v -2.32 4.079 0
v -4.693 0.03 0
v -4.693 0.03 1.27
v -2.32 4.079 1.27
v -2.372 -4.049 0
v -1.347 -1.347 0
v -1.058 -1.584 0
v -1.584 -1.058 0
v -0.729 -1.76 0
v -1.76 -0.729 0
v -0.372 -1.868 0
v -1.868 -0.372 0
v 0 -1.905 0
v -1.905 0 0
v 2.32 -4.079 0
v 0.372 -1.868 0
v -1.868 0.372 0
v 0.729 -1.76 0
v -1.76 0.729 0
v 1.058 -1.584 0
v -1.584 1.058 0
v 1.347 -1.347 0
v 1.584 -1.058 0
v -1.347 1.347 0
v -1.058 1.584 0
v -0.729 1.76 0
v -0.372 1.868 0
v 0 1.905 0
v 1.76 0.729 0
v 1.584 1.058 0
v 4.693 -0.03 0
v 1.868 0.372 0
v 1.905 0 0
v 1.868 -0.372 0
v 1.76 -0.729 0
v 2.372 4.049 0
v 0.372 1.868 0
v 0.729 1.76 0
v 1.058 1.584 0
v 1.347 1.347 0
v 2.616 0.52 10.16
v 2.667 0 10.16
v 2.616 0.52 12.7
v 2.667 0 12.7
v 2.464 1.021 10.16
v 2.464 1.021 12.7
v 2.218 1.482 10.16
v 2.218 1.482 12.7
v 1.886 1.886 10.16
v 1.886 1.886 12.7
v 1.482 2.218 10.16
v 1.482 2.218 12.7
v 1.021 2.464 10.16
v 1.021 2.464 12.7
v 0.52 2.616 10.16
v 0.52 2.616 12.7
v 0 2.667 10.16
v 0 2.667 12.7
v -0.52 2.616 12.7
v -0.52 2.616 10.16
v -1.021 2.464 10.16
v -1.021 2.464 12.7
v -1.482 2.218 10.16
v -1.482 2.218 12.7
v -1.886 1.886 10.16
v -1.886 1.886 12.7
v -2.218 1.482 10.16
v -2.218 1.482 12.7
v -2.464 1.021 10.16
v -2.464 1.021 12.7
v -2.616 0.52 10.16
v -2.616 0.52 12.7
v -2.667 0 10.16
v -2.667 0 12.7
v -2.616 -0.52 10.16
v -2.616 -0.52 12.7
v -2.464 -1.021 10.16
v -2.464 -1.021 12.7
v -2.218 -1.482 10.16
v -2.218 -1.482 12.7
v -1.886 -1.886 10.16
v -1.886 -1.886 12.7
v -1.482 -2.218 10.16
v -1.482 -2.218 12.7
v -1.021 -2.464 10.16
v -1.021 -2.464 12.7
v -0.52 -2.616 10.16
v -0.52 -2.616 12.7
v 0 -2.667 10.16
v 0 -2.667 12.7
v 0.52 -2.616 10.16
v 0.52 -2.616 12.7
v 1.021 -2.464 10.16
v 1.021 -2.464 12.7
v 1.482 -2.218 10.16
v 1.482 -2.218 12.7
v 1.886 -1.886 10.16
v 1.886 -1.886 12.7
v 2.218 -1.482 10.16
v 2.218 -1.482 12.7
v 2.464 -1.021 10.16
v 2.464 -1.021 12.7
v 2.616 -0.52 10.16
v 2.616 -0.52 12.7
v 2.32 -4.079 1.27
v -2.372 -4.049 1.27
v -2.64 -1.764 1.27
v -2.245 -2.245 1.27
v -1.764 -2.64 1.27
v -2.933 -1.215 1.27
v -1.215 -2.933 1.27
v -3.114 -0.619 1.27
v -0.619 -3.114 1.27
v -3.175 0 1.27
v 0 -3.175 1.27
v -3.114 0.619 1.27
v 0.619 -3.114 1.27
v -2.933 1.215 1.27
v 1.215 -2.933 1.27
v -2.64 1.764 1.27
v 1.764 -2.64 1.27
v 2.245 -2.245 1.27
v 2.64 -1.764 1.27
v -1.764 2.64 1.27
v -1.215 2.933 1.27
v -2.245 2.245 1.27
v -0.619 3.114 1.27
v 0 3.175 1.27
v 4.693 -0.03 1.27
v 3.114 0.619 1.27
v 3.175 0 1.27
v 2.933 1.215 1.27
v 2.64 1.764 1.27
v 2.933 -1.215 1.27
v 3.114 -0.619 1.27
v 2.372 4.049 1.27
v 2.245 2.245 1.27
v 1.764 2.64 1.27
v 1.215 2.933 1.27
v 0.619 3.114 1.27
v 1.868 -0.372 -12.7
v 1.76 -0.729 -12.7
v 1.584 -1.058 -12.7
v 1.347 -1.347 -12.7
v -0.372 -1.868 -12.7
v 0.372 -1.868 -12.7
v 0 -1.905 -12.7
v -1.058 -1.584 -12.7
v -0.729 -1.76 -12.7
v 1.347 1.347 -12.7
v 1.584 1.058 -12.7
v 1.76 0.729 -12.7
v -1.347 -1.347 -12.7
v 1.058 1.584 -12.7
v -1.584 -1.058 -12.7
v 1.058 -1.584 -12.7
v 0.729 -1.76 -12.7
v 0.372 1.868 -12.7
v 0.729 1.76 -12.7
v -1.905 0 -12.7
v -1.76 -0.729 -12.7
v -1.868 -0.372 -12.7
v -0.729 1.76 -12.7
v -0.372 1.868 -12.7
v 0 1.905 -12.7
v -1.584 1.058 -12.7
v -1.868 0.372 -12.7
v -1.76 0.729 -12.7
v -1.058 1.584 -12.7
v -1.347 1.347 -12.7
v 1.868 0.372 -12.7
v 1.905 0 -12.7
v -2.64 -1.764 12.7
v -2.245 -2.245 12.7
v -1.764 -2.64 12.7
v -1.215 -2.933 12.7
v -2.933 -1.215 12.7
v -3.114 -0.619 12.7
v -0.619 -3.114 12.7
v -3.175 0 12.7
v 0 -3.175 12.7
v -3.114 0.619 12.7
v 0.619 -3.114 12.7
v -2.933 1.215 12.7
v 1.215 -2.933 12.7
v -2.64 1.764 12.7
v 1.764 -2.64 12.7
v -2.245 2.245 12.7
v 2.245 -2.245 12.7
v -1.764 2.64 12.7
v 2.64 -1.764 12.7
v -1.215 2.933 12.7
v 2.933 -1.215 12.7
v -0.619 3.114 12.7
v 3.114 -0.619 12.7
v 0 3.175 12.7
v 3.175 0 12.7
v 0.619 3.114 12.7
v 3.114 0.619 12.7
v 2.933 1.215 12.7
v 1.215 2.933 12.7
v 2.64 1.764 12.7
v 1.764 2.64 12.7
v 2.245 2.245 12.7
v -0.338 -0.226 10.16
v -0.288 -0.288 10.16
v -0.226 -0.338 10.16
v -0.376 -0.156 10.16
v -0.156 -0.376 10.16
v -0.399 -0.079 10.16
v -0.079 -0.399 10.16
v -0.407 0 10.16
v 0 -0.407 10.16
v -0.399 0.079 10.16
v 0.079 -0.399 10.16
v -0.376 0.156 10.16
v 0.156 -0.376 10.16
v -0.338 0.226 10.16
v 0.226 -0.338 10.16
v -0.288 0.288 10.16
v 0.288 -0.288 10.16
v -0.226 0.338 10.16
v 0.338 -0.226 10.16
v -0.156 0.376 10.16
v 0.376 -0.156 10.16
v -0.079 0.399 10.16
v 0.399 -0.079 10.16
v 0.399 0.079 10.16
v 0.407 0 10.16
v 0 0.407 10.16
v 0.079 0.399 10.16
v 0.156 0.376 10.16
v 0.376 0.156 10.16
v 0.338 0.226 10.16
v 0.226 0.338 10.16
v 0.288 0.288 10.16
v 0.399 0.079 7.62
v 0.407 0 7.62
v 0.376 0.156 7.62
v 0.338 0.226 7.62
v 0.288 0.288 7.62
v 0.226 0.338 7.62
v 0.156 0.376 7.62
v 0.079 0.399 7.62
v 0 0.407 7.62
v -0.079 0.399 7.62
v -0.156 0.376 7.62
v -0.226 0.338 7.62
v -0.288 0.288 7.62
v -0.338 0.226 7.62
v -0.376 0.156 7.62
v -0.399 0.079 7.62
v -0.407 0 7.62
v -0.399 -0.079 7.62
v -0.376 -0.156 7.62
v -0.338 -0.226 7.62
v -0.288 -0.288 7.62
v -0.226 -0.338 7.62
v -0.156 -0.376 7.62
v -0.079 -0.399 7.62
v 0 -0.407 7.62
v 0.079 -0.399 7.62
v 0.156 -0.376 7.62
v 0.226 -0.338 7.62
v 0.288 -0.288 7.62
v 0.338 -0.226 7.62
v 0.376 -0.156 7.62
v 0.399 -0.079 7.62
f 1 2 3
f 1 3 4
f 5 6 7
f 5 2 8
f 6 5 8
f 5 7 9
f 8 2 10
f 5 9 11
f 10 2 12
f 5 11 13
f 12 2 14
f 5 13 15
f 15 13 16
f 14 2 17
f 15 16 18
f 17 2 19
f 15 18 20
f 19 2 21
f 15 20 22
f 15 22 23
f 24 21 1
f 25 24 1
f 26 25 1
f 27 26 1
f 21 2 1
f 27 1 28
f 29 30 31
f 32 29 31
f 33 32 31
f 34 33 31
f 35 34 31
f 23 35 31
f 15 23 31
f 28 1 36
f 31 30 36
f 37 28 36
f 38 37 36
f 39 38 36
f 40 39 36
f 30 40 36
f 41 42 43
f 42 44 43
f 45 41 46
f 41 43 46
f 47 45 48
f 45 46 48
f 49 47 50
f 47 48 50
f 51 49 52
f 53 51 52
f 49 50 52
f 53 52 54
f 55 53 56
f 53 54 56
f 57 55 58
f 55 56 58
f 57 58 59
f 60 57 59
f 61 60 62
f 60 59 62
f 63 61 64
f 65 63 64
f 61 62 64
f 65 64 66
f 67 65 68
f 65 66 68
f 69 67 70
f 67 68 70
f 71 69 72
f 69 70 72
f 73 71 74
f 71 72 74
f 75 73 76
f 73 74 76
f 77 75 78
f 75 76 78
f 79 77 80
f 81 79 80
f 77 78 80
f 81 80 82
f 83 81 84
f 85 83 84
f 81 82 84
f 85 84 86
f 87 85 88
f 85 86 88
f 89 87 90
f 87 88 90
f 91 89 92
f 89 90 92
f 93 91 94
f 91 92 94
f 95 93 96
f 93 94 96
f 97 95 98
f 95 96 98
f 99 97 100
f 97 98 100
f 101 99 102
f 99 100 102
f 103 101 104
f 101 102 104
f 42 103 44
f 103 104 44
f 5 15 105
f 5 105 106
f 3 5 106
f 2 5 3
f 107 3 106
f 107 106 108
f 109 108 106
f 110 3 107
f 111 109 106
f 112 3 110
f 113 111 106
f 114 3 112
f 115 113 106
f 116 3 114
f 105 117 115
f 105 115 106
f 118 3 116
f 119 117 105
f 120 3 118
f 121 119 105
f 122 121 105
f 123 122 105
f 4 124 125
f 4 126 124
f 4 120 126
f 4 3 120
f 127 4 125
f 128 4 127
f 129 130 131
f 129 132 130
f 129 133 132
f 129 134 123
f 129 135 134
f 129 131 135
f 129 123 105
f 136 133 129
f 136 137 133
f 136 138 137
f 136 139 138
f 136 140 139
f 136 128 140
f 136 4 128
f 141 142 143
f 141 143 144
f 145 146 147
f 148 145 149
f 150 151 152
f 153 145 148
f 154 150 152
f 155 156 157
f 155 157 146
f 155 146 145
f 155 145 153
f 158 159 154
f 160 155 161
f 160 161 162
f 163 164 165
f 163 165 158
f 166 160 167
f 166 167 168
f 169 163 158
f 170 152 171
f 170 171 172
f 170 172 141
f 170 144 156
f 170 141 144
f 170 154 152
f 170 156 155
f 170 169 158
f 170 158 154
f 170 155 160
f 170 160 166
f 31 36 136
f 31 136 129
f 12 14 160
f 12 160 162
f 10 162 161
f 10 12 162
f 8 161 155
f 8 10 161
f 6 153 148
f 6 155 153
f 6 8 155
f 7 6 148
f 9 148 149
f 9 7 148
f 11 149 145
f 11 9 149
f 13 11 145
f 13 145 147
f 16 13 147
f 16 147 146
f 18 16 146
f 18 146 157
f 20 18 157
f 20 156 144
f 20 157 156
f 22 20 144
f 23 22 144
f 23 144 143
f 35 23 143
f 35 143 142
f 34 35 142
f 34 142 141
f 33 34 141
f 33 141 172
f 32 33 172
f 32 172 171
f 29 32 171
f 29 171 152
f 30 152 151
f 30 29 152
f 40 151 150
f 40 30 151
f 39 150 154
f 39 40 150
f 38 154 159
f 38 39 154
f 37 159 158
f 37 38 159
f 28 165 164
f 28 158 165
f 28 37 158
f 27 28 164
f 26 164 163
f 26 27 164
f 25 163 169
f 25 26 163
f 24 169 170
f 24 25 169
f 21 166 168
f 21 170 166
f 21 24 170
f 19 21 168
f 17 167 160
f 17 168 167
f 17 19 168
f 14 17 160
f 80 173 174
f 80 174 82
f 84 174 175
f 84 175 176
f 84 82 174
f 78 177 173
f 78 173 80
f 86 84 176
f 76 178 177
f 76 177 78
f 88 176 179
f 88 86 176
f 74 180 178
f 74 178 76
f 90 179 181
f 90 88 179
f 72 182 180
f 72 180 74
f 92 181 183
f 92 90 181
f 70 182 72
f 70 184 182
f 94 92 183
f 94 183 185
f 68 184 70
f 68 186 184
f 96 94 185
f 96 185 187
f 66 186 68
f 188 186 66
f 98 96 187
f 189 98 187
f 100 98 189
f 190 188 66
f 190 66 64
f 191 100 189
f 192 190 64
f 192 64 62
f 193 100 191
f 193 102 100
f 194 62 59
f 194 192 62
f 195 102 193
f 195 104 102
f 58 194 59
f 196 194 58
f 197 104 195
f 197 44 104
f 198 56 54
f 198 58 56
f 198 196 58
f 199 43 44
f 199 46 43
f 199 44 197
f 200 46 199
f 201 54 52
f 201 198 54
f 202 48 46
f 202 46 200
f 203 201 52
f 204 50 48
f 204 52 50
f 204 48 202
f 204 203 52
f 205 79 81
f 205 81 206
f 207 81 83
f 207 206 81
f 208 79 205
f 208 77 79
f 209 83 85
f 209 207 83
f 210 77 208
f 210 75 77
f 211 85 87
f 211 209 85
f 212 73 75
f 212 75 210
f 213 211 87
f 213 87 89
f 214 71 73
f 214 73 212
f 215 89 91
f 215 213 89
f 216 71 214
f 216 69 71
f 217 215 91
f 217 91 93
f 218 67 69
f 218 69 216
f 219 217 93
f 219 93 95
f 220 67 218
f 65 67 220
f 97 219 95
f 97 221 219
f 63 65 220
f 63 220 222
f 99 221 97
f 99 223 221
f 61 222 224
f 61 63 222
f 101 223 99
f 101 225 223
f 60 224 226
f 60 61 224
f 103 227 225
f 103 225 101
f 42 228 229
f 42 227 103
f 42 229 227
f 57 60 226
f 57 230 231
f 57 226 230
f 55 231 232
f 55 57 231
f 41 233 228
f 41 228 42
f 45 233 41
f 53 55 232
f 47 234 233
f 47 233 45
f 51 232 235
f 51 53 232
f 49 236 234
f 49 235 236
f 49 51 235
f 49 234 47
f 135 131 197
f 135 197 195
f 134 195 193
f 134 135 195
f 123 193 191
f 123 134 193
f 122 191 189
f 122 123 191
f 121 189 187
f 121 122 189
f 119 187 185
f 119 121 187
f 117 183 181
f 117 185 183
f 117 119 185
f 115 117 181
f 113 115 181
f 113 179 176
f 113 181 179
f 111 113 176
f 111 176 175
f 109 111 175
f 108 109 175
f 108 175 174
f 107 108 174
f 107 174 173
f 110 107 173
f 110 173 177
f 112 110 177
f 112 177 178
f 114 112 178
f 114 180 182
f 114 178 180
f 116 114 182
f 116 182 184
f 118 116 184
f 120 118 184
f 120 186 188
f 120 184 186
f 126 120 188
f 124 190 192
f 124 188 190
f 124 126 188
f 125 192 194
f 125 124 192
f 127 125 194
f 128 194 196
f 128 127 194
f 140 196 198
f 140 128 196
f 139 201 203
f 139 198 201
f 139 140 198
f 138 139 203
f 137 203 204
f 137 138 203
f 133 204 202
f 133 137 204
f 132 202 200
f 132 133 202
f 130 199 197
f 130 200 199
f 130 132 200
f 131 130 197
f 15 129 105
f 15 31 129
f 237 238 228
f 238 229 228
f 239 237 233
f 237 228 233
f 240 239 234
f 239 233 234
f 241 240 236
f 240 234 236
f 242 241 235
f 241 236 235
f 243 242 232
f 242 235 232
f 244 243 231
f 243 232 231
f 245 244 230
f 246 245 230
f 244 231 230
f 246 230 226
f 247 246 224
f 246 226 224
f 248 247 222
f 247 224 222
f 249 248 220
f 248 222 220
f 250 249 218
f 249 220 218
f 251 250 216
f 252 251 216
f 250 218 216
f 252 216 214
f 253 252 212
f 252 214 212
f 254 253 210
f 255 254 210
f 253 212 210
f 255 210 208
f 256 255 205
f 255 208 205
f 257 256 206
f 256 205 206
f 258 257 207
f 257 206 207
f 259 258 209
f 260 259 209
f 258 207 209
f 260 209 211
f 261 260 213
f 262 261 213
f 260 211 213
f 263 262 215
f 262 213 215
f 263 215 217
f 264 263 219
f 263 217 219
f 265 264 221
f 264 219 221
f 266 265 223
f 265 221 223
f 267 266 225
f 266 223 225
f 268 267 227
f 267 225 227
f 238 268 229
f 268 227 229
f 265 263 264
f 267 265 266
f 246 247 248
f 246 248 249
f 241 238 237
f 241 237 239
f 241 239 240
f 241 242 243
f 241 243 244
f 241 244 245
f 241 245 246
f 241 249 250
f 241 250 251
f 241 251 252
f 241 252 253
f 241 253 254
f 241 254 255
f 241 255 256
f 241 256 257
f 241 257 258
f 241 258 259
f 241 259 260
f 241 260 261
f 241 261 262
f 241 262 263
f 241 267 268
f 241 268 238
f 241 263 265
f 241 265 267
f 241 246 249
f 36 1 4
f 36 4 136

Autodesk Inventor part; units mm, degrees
ref_plane "YZ Plane" through (0, 0, 0) normal (1, 0, 0) x (0, 1, 0)
ref_plane "XZ Plane" through (0, 0, 0) normal (0, 1, 0) x (-1, 0, 0)
ref_plane "XY Plane" through (0, 0, 0) normal (0, 0, 1) x (1, 0, 0)
sketch "Sketch1" plane through (0, 0, 0) normal (0, 0, 1) x (1, 0, 0)
  line L0 (2.3725, 4.0488) -> (4.6926, -0.0303)
  line L1 (4.6926, -0.0303) -> (2.3201, -4.0791)
  line L2 (2.3201, -4.0791) -> (-2.3725, -4.0488)
  line L3 (-2.3725, -4.0488) -> (-4.6926, 0.0303)
  line L4 (-4.6926, 0.0303) -> (-2.3201, 4.0791)
  line L5 (-2.3201, 4.0791) -> (2.3725, 4.0488)
  point P0 (0, 0)
  point P1 (0, 0)
  dimension "d0" = 8.128
extrude "Extrusion1" add sketch "Sketch1" along normal blind 1.27
sketch "Sketch2" plane through (0, 0, 1.27) normal (0, 0, 1) x (1, 0, 0)
  circle A0 centre (0, 0) radius 3.175
  dimension "d3" = 6.35
extrude "Extrusion2" add sketch "Sketch2" along normal blind 11.43
thread "Thread1" size "1/4-36 UNS" class "2A" standard "ANSI Unified Screw Threads" full length
sketch "Sketch3" plane through (0, 0, 12.7) normal (0, 0, 1) x (1, 0, 0)
  circle A0 centre (0, 0) radius 3.175 projected
  circle A1 centre (0, 0) radius 2.667
  dimension "d9" = 0.508
extrude "Extrusion3" cut sketch "Sketch3" against normal blind 2.54 contours A1
sketch "Sketch4" plane through (0, 0, 10.16) normal (0, 0, 1) x (1, 0, 0)
  circle A0 centre (0, 0) radius 2.667 projected
  circle A1 centre (0, 0) radius 0.4071
extrude "Extrusion4" cut sketch "Sketch4" against normal blind 2.54 contours A1
sketch "Sketch5" plane through (0, 0, 0) normal (0, 0, -1) x (-1, 0, 0)
  circle A0 centre (0, 0) radius 1.905
  dimension "d14" = 3.81
extrude "Extrusion5" add sketch "Sketch5" along normal blind 12.7
properties part number "sma_female_bulkhead" material "Gold"
